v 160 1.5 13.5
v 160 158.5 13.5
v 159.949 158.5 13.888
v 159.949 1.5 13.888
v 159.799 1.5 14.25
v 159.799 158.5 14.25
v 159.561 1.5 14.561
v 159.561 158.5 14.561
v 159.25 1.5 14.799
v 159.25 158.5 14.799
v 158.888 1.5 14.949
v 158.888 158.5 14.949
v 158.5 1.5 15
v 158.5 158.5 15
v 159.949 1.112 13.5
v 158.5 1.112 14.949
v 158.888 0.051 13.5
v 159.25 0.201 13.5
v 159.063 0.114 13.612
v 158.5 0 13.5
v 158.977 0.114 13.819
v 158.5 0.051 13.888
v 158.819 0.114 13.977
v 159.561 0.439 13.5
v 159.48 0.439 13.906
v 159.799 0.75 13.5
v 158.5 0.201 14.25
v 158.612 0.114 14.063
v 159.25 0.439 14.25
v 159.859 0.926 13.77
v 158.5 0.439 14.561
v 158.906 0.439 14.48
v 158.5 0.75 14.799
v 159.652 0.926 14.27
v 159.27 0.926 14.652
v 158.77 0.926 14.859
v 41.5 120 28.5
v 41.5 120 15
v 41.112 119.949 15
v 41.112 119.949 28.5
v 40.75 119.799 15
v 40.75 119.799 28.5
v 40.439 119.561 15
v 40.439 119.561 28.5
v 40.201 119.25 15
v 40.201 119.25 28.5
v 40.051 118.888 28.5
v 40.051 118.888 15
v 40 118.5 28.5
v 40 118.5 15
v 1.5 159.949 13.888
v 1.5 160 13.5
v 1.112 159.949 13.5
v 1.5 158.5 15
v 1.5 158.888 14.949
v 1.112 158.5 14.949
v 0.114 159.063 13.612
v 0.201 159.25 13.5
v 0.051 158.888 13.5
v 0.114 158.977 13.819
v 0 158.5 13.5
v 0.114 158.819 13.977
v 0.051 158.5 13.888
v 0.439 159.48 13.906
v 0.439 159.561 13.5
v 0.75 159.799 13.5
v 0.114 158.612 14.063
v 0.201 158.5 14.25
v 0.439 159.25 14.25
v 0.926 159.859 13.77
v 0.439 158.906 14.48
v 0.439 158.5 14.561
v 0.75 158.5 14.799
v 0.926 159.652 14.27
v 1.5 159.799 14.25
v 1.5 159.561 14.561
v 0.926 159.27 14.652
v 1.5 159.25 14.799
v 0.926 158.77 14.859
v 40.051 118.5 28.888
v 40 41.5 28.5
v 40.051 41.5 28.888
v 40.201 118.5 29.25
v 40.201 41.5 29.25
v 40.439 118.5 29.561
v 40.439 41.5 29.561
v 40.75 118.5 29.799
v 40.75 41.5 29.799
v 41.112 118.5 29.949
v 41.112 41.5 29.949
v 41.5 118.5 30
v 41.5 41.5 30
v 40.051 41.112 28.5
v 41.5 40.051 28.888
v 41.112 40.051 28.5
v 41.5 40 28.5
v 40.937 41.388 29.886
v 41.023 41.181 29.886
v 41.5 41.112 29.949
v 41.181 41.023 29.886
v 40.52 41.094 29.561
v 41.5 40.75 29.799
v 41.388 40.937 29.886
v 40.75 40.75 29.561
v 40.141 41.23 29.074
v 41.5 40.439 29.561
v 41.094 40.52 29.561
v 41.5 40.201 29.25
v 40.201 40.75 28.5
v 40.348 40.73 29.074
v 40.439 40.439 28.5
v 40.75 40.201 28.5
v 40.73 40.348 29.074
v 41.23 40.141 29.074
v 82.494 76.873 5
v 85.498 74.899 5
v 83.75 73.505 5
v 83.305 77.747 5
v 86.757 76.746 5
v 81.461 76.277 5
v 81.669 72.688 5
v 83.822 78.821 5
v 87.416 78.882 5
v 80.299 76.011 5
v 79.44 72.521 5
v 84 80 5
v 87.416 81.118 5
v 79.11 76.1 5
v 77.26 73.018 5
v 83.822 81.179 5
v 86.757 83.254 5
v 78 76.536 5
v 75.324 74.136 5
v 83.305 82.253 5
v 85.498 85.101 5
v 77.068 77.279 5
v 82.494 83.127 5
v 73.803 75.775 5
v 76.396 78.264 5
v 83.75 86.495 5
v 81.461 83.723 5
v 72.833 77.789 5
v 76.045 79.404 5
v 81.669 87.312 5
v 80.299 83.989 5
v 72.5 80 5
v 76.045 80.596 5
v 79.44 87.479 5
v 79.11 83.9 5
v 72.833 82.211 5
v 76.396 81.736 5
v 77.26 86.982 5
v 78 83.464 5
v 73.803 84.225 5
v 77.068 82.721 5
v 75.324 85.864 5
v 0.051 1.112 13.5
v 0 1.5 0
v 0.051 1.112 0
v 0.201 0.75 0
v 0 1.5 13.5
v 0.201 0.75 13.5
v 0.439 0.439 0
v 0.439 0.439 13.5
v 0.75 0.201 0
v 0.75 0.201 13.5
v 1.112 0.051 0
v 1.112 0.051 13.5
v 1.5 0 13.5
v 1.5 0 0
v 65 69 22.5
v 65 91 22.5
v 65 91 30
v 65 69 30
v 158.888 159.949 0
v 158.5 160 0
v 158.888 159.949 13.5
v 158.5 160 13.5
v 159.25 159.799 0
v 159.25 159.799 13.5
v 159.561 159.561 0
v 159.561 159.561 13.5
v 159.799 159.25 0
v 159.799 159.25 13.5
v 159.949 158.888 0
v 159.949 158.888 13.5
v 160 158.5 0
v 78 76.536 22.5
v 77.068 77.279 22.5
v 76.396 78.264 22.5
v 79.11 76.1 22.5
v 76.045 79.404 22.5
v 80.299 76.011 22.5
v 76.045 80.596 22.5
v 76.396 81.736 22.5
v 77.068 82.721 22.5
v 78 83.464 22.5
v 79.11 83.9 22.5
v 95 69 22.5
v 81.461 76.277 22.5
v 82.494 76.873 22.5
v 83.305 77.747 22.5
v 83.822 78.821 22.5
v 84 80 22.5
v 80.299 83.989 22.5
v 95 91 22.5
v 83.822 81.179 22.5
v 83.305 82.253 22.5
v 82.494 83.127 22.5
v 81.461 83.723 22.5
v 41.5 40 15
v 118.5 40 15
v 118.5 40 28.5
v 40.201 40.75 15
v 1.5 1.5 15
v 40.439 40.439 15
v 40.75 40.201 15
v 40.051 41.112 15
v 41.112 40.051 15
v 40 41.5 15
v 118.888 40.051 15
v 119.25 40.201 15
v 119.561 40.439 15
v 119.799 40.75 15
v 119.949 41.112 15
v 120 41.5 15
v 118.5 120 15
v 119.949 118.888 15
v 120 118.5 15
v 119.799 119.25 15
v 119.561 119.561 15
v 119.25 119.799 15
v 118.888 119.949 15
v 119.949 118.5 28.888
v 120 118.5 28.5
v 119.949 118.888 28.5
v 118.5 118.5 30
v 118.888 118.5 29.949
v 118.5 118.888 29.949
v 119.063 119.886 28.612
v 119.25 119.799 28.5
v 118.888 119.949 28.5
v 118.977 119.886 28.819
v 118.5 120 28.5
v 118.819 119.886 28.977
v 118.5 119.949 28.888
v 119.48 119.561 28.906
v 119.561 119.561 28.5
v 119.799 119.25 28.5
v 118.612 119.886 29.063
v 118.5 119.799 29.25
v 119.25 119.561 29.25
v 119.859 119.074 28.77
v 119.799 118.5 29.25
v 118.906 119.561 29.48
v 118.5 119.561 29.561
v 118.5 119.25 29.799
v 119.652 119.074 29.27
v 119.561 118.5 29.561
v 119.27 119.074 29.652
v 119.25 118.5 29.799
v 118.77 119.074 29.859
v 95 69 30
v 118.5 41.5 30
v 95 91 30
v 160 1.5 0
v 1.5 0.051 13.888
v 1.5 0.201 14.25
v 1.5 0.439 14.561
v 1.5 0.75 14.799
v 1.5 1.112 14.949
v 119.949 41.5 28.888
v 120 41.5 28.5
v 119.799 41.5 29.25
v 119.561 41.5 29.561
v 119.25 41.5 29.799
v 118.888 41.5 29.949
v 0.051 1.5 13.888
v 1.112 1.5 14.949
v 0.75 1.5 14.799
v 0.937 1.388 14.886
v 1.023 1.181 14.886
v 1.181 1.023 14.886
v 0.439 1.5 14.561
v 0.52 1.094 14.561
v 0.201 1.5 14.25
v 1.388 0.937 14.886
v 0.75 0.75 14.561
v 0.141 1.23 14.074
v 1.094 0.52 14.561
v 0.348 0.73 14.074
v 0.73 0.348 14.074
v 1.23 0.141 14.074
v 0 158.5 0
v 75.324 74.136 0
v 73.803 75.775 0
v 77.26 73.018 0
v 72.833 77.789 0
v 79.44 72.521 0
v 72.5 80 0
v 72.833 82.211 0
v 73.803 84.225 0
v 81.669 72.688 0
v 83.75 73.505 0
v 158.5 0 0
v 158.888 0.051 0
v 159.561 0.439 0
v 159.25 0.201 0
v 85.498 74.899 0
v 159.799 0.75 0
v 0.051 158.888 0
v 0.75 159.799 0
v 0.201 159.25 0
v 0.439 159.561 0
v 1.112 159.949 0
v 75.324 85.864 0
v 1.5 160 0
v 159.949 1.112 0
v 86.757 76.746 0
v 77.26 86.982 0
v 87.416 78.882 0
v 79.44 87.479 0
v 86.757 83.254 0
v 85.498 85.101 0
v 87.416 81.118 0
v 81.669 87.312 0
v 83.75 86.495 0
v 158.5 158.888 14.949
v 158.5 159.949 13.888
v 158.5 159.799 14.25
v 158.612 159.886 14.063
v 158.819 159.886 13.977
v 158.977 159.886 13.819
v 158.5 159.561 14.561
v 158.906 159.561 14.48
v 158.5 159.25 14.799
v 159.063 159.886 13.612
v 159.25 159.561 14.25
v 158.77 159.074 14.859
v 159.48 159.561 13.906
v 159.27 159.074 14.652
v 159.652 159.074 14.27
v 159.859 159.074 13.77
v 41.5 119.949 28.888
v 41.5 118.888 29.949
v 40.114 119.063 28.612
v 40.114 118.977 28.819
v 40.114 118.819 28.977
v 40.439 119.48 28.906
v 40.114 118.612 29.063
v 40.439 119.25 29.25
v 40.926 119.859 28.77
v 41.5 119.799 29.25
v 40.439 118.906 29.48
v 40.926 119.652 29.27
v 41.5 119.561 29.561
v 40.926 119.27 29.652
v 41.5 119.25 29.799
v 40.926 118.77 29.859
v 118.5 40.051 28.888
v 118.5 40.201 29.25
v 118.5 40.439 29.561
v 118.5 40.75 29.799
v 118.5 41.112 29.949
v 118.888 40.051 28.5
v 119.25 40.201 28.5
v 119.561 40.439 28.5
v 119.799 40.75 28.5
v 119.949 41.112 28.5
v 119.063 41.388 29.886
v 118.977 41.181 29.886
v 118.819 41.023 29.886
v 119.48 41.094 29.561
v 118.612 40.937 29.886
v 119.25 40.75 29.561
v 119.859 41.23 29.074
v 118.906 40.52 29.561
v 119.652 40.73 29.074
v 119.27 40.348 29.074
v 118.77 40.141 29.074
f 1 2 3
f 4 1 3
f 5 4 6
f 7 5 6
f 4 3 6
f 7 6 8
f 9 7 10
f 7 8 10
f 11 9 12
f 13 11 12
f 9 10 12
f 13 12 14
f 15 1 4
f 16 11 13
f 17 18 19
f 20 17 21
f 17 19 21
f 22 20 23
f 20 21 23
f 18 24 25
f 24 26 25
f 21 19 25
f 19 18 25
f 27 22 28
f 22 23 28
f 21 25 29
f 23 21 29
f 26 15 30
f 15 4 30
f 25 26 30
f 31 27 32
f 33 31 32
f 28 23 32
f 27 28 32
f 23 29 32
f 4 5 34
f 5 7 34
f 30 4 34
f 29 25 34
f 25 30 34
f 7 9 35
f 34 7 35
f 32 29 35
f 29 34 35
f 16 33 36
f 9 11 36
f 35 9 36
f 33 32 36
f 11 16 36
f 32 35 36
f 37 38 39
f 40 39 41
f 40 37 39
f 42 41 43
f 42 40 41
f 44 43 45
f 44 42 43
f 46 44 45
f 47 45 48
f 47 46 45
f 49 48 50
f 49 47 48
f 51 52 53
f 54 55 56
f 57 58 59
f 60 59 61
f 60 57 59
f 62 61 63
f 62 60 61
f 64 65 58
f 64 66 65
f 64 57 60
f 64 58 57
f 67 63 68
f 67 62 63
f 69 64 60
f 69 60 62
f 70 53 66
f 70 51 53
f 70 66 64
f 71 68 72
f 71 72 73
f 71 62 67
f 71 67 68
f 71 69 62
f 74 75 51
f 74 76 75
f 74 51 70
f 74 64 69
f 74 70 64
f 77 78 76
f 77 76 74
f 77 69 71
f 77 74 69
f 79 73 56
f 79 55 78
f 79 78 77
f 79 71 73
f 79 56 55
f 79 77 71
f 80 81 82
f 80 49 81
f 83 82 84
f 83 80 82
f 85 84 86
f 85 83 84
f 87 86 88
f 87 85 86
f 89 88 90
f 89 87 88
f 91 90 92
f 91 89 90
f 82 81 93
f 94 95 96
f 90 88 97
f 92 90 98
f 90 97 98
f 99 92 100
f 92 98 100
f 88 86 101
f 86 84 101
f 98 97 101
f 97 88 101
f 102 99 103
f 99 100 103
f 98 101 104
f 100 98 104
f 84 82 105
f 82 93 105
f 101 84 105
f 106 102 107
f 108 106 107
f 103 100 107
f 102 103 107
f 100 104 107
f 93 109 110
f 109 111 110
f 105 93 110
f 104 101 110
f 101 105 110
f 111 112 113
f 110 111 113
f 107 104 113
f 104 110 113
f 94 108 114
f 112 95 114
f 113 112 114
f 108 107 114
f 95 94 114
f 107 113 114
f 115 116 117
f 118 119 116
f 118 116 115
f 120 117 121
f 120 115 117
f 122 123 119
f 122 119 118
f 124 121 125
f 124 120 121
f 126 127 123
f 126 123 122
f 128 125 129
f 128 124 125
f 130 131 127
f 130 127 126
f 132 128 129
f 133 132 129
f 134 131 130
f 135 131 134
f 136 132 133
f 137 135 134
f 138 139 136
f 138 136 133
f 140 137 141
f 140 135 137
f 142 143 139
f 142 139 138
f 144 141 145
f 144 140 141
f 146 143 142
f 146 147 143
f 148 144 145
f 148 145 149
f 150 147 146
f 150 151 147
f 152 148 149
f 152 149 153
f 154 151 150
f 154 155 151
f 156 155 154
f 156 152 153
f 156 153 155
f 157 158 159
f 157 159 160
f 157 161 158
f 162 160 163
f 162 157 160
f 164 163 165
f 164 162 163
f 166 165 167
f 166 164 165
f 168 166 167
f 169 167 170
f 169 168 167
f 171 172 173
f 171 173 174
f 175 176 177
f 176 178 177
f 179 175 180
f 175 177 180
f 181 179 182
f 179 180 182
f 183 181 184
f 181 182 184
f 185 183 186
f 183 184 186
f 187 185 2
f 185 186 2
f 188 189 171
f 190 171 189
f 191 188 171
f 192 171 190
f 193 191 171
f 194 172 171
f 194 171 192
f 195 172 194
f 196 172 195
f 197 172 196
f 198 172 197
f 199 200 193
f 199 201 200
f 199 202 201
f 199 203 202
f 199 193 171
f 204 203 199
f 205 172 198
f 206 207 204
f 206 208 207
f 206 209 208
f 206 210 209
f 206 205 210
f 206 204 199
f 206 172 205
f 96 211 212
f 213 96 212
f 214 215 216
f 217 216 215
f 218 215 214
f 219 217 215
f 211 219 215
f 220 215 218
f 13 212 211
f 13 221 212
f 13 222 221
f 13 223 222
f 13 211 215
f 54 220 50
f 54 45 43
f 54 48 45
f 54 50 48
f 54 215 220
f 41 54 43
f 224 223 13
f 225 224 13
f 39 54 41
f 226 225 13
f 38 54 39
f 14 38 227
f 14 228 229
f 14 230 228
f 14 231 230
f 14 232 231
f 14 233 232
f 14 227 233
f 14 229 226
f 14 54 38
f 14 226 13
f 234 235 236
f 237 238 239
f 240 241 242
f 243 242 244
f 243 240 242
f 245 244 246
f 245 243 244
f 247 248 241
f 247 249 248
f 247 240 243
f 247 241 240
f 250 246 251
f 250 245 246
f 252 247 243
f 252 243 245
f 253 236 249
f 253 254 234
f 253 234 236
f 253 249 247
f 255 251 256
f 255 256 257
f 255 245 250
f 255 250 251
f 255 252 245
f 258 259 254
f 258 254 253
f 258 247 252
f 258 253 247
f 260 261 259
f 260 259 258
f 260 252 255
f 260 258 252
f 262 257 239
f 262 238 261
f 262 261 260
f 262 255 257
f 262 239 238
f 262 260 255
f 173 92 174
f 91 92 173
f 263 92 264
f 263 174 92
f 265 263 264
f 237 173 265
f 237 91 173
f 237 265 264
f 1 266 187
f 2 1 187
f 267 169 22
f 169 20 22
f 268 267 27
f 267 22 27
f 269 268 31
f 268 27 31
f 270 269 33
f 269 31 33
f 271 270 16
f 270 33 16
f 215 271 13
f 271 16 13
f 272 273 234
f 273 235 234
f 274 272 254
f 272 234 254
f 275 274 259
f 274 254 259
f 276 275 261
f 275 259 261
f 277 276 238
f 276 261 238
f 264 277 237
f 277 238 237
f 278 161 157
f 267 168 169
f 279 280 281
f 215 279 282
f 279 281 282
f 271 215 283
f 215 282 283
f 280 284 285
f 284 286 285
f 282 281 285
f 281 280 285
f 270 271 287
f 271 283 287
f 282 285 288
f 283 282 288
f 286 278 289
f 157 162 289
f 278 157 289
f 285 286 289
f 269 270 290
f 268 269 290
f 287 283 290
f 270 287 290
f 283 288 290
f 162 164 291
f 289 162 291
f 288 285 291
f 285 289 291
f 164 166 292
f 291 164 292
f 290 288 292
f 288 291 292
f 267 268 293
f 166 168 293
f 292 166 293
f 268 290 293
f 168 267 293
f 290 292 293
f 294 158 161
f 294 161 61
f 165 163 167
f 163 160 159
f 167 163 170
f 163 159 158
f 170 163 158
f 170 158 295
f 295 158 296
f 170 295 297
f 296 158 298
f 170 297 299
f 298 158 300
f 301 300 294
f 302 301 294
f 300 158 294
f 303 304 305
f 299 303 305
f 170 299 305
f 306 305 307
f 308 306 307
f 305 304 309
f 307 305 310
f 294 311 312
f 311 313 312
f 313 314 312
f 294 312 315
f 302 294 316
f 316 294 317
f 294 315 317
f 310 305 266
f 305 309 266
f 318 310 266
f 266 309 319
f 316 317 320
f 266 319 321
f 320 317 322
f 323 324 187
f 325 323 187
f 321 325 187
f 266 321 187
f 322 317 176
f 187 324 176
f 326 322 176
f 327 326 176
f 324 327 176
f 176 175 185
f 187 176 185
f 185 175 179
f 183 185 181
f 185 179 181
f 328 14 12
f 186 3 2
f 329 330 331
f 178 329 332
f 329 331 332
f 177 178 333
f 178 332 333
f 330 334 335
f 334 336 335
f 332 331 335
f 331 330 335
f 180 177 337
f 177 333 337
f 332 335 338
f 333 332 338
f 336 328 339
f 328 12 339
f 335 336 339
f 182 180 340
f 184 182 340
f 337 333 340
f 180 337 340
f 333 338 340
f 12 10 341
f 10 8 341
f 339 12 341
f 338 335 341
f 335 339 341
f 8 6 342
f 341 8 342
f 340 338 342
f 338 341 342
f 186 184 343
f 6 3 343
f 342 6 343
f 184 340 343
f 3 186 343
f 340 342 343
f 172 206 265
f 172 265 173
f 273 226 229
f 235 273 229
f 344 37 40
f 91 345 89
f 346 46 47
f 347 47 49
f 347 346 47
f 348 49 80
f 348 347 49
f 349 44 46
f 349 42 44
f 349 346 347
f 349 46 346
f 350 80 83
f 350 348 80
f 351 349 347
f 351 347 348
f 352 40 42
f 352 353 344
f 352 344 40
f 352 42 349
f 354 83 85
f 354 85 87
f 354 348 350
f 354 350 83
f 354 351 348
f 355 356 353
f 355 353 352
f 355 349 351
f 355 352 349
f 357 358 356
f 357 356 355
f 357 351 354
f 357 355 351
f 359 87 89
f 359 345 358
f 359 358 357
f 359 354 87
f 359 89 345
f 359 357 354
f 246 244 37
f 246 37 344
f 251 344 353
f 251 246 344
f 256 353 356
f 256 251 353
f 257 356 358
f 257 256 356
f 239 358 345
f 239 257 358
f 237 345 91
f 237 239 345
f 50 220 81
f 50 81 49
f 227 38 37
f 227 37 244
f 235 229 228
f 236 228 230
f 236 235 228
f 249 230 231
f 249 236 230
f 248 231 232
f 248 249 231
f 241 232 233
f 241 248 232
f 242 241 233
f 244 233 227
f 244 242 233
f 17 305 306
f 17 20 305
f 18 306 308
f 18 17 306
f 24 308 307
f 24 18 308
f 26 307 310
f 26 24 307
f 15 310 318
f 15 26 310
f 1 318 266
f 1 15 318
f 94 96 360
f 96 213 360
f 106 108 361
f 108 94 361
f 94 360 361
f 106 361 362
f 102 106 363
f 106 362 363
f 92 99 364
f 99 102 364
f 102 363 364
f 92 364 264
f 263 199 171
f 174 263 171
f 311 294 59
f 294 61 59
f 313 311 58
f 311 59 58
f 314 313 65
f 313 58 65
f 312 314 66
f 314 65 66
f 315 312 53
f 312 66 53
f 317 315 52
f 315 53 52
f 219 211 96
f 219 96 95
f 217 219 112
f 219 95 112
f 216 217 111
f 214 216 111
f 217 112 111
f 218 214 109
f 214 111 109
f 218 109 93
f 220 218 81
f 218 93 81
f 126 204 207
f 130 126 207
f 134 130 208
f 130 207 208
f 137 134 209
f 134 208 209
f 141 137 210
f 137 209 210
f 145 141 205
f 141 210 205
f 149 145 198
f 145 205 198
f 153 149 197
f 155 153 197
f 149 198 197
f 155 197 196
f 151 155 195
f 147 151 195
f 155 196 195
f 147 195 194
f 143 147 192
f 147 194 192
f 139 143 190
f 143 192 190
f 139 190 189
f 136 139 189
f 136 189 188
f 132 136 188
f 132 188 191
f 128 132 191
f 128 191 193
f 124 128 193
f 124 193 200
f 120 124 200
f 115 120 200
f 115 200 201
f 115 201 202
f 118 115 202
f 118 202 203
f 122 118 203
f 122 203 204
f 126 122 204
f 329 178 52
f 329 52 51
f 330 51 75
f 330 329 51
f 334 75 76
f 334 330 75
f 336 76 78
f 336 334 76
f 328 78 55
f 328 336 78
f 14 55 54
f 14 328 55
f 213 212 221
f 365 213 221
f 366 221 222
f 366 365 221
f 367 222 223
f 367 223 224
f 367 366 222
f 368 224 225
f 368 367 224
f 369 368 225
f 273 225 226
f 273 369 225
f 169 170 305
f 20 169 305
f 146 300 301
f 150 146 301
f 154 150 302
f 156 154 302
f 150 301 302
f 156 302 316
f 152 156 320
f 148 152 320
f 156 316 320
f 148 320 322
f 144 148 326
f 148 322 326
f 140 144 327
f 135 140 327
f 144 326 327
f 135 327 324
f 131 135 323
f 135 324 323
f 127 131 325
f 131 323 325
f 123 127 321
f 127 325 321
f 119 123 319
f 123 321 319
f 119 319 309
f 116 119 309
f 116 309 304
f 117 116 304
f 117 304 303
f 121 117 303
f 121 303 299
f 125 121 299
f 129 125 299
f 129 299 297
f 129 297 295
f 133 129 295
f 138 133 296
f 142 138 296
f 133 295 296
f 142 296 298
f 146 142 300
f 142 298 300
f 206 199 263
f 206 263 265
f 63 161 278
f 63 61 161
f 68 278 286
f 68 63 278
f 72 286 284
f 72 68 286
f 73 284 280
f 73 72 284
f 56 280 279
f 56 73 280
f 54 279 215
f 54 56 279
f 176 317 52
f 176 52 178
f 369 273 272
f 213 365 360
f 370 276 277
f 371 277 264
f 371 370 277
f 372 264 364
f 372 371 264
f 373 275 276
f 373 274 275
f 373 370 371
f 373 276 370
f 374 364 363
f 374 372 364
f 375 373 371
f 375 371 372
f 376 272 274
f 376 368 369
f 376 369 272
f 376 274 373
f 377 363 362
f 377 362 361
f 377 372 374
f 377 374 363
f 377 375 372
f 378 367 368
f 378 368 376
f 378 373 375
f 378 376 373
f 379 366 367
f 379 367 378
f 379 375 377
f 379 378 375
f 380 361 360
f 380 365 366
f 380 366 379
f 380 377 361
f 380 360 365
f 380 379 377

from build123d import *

# Parameters (mm, degrees)
SKETCH1_W           = 160
SKETCH1_H           = 160
SKETCH1_W_2         = 80
SKETCH1_H_2         = 80
BOSS_EXTRUDE1_DEPTH = 15
SKETCH1_5_W         = 80
SKETCH1_5_H         = 80
BOSS_EXTRUDE2_DEPTH = 30
SKETCH1_6_W         = 30
SKETCH1_6_H         = 22
BOSS_EXTRUDE3_DEPTH = 22.5
SKETCH2_R           = 4
CUT_EXTRUDE2_DEPTH  = 22.5
SKETCH3_R           = 7.5
CUT_EXTRUDE3_DEPTH  = 5
FILLET1_R           = 1.5


with BuildPart() as part:
    # Sketch1 → Boss-Extrude1 (new body)
    with BuildSketch(Plane.XY):
        with Locations((80, 80)):
            Rectangle(SKETCH1_W, SKETCH1_H)
        with Locations((80, 80)):
            Rectangle(SKETCH1_W_2, SKETCH1_H_2, mode=Mode.SUBTRACT)
    extrude(amount=BOSS_EXTRUDE1_DEPTH)

    # Sketch1<5> → Boss-Extrude2 (add)
    with BuildSketch(Plane.XY):
        with Locations((80, 80)):
            Rectangle(SKETCH1_5_W, SKETCH1_5_H)
        Polygon((65, 91), (80, 91), (95, 91), (95, 69), (80, 69), (65, 69), align=None, mode=Mode.SUBTRACT)
    extrude(amount=BOSS_EXTRUDE2_DEPTH)

    # Sketch1<6> → Boss-Extrude3 (add)
    with BuildSketch(Plane.XY):
        with Locations((80, 80)):
            Rectangle(SKETCH1_6_W, SKETCH1_6_H)
    extrude(amount=BOSS_EXTRUDE3_DEPTH)

    # Sketch2 → Cut-Extrude2 (cut)
    with BuildSketch(Plane.XY.offset(22.5)):
        with Locations((80, 80)):
            Circle(SKETCH2_R)
    extrude(amount=-CUT_EXTRUDE2_DEPTH, mode=Mode.SUBTRACT)

    # Sketch3 → Cut-Extrude3 (cut)
    with BuildSketch(Plane(origin=(0, 0, 0), x_dir=(-1, 0, 0), z_dir=(0, 0, -1))):
        with Locations((-80, 80)):
            Circle(SKETCH3_R)
    extrude(amount=-CUT_EXTRUDE3_DEPTH, mode=Mode.SUBTRACT)

    # Fillet1
    fillet1_edges = [part.edges().sort_by_distance(p)[0] for p in [
        (0, 0, 7.5),
        (80, 0, 15),
        (160, 0, 7.5),
        (160, 160, 7.5),
        (160, 80, 15),
        (0, 160, 7.5),
        (80, 160, 15),
        (0, 80, 15),
        (40, 40, 22.5),
        (40, 120, 22.5),
        (120, 120, 22.5),
        (120, 40, 22.5),
        (40, 80, 30),
        (120, 80, 30),
        (80, 120, 30),
        (80, 40, 30),
    ]]
    fillet(fillet1_edges, radius=FILLET1_R)


solid = part.part
